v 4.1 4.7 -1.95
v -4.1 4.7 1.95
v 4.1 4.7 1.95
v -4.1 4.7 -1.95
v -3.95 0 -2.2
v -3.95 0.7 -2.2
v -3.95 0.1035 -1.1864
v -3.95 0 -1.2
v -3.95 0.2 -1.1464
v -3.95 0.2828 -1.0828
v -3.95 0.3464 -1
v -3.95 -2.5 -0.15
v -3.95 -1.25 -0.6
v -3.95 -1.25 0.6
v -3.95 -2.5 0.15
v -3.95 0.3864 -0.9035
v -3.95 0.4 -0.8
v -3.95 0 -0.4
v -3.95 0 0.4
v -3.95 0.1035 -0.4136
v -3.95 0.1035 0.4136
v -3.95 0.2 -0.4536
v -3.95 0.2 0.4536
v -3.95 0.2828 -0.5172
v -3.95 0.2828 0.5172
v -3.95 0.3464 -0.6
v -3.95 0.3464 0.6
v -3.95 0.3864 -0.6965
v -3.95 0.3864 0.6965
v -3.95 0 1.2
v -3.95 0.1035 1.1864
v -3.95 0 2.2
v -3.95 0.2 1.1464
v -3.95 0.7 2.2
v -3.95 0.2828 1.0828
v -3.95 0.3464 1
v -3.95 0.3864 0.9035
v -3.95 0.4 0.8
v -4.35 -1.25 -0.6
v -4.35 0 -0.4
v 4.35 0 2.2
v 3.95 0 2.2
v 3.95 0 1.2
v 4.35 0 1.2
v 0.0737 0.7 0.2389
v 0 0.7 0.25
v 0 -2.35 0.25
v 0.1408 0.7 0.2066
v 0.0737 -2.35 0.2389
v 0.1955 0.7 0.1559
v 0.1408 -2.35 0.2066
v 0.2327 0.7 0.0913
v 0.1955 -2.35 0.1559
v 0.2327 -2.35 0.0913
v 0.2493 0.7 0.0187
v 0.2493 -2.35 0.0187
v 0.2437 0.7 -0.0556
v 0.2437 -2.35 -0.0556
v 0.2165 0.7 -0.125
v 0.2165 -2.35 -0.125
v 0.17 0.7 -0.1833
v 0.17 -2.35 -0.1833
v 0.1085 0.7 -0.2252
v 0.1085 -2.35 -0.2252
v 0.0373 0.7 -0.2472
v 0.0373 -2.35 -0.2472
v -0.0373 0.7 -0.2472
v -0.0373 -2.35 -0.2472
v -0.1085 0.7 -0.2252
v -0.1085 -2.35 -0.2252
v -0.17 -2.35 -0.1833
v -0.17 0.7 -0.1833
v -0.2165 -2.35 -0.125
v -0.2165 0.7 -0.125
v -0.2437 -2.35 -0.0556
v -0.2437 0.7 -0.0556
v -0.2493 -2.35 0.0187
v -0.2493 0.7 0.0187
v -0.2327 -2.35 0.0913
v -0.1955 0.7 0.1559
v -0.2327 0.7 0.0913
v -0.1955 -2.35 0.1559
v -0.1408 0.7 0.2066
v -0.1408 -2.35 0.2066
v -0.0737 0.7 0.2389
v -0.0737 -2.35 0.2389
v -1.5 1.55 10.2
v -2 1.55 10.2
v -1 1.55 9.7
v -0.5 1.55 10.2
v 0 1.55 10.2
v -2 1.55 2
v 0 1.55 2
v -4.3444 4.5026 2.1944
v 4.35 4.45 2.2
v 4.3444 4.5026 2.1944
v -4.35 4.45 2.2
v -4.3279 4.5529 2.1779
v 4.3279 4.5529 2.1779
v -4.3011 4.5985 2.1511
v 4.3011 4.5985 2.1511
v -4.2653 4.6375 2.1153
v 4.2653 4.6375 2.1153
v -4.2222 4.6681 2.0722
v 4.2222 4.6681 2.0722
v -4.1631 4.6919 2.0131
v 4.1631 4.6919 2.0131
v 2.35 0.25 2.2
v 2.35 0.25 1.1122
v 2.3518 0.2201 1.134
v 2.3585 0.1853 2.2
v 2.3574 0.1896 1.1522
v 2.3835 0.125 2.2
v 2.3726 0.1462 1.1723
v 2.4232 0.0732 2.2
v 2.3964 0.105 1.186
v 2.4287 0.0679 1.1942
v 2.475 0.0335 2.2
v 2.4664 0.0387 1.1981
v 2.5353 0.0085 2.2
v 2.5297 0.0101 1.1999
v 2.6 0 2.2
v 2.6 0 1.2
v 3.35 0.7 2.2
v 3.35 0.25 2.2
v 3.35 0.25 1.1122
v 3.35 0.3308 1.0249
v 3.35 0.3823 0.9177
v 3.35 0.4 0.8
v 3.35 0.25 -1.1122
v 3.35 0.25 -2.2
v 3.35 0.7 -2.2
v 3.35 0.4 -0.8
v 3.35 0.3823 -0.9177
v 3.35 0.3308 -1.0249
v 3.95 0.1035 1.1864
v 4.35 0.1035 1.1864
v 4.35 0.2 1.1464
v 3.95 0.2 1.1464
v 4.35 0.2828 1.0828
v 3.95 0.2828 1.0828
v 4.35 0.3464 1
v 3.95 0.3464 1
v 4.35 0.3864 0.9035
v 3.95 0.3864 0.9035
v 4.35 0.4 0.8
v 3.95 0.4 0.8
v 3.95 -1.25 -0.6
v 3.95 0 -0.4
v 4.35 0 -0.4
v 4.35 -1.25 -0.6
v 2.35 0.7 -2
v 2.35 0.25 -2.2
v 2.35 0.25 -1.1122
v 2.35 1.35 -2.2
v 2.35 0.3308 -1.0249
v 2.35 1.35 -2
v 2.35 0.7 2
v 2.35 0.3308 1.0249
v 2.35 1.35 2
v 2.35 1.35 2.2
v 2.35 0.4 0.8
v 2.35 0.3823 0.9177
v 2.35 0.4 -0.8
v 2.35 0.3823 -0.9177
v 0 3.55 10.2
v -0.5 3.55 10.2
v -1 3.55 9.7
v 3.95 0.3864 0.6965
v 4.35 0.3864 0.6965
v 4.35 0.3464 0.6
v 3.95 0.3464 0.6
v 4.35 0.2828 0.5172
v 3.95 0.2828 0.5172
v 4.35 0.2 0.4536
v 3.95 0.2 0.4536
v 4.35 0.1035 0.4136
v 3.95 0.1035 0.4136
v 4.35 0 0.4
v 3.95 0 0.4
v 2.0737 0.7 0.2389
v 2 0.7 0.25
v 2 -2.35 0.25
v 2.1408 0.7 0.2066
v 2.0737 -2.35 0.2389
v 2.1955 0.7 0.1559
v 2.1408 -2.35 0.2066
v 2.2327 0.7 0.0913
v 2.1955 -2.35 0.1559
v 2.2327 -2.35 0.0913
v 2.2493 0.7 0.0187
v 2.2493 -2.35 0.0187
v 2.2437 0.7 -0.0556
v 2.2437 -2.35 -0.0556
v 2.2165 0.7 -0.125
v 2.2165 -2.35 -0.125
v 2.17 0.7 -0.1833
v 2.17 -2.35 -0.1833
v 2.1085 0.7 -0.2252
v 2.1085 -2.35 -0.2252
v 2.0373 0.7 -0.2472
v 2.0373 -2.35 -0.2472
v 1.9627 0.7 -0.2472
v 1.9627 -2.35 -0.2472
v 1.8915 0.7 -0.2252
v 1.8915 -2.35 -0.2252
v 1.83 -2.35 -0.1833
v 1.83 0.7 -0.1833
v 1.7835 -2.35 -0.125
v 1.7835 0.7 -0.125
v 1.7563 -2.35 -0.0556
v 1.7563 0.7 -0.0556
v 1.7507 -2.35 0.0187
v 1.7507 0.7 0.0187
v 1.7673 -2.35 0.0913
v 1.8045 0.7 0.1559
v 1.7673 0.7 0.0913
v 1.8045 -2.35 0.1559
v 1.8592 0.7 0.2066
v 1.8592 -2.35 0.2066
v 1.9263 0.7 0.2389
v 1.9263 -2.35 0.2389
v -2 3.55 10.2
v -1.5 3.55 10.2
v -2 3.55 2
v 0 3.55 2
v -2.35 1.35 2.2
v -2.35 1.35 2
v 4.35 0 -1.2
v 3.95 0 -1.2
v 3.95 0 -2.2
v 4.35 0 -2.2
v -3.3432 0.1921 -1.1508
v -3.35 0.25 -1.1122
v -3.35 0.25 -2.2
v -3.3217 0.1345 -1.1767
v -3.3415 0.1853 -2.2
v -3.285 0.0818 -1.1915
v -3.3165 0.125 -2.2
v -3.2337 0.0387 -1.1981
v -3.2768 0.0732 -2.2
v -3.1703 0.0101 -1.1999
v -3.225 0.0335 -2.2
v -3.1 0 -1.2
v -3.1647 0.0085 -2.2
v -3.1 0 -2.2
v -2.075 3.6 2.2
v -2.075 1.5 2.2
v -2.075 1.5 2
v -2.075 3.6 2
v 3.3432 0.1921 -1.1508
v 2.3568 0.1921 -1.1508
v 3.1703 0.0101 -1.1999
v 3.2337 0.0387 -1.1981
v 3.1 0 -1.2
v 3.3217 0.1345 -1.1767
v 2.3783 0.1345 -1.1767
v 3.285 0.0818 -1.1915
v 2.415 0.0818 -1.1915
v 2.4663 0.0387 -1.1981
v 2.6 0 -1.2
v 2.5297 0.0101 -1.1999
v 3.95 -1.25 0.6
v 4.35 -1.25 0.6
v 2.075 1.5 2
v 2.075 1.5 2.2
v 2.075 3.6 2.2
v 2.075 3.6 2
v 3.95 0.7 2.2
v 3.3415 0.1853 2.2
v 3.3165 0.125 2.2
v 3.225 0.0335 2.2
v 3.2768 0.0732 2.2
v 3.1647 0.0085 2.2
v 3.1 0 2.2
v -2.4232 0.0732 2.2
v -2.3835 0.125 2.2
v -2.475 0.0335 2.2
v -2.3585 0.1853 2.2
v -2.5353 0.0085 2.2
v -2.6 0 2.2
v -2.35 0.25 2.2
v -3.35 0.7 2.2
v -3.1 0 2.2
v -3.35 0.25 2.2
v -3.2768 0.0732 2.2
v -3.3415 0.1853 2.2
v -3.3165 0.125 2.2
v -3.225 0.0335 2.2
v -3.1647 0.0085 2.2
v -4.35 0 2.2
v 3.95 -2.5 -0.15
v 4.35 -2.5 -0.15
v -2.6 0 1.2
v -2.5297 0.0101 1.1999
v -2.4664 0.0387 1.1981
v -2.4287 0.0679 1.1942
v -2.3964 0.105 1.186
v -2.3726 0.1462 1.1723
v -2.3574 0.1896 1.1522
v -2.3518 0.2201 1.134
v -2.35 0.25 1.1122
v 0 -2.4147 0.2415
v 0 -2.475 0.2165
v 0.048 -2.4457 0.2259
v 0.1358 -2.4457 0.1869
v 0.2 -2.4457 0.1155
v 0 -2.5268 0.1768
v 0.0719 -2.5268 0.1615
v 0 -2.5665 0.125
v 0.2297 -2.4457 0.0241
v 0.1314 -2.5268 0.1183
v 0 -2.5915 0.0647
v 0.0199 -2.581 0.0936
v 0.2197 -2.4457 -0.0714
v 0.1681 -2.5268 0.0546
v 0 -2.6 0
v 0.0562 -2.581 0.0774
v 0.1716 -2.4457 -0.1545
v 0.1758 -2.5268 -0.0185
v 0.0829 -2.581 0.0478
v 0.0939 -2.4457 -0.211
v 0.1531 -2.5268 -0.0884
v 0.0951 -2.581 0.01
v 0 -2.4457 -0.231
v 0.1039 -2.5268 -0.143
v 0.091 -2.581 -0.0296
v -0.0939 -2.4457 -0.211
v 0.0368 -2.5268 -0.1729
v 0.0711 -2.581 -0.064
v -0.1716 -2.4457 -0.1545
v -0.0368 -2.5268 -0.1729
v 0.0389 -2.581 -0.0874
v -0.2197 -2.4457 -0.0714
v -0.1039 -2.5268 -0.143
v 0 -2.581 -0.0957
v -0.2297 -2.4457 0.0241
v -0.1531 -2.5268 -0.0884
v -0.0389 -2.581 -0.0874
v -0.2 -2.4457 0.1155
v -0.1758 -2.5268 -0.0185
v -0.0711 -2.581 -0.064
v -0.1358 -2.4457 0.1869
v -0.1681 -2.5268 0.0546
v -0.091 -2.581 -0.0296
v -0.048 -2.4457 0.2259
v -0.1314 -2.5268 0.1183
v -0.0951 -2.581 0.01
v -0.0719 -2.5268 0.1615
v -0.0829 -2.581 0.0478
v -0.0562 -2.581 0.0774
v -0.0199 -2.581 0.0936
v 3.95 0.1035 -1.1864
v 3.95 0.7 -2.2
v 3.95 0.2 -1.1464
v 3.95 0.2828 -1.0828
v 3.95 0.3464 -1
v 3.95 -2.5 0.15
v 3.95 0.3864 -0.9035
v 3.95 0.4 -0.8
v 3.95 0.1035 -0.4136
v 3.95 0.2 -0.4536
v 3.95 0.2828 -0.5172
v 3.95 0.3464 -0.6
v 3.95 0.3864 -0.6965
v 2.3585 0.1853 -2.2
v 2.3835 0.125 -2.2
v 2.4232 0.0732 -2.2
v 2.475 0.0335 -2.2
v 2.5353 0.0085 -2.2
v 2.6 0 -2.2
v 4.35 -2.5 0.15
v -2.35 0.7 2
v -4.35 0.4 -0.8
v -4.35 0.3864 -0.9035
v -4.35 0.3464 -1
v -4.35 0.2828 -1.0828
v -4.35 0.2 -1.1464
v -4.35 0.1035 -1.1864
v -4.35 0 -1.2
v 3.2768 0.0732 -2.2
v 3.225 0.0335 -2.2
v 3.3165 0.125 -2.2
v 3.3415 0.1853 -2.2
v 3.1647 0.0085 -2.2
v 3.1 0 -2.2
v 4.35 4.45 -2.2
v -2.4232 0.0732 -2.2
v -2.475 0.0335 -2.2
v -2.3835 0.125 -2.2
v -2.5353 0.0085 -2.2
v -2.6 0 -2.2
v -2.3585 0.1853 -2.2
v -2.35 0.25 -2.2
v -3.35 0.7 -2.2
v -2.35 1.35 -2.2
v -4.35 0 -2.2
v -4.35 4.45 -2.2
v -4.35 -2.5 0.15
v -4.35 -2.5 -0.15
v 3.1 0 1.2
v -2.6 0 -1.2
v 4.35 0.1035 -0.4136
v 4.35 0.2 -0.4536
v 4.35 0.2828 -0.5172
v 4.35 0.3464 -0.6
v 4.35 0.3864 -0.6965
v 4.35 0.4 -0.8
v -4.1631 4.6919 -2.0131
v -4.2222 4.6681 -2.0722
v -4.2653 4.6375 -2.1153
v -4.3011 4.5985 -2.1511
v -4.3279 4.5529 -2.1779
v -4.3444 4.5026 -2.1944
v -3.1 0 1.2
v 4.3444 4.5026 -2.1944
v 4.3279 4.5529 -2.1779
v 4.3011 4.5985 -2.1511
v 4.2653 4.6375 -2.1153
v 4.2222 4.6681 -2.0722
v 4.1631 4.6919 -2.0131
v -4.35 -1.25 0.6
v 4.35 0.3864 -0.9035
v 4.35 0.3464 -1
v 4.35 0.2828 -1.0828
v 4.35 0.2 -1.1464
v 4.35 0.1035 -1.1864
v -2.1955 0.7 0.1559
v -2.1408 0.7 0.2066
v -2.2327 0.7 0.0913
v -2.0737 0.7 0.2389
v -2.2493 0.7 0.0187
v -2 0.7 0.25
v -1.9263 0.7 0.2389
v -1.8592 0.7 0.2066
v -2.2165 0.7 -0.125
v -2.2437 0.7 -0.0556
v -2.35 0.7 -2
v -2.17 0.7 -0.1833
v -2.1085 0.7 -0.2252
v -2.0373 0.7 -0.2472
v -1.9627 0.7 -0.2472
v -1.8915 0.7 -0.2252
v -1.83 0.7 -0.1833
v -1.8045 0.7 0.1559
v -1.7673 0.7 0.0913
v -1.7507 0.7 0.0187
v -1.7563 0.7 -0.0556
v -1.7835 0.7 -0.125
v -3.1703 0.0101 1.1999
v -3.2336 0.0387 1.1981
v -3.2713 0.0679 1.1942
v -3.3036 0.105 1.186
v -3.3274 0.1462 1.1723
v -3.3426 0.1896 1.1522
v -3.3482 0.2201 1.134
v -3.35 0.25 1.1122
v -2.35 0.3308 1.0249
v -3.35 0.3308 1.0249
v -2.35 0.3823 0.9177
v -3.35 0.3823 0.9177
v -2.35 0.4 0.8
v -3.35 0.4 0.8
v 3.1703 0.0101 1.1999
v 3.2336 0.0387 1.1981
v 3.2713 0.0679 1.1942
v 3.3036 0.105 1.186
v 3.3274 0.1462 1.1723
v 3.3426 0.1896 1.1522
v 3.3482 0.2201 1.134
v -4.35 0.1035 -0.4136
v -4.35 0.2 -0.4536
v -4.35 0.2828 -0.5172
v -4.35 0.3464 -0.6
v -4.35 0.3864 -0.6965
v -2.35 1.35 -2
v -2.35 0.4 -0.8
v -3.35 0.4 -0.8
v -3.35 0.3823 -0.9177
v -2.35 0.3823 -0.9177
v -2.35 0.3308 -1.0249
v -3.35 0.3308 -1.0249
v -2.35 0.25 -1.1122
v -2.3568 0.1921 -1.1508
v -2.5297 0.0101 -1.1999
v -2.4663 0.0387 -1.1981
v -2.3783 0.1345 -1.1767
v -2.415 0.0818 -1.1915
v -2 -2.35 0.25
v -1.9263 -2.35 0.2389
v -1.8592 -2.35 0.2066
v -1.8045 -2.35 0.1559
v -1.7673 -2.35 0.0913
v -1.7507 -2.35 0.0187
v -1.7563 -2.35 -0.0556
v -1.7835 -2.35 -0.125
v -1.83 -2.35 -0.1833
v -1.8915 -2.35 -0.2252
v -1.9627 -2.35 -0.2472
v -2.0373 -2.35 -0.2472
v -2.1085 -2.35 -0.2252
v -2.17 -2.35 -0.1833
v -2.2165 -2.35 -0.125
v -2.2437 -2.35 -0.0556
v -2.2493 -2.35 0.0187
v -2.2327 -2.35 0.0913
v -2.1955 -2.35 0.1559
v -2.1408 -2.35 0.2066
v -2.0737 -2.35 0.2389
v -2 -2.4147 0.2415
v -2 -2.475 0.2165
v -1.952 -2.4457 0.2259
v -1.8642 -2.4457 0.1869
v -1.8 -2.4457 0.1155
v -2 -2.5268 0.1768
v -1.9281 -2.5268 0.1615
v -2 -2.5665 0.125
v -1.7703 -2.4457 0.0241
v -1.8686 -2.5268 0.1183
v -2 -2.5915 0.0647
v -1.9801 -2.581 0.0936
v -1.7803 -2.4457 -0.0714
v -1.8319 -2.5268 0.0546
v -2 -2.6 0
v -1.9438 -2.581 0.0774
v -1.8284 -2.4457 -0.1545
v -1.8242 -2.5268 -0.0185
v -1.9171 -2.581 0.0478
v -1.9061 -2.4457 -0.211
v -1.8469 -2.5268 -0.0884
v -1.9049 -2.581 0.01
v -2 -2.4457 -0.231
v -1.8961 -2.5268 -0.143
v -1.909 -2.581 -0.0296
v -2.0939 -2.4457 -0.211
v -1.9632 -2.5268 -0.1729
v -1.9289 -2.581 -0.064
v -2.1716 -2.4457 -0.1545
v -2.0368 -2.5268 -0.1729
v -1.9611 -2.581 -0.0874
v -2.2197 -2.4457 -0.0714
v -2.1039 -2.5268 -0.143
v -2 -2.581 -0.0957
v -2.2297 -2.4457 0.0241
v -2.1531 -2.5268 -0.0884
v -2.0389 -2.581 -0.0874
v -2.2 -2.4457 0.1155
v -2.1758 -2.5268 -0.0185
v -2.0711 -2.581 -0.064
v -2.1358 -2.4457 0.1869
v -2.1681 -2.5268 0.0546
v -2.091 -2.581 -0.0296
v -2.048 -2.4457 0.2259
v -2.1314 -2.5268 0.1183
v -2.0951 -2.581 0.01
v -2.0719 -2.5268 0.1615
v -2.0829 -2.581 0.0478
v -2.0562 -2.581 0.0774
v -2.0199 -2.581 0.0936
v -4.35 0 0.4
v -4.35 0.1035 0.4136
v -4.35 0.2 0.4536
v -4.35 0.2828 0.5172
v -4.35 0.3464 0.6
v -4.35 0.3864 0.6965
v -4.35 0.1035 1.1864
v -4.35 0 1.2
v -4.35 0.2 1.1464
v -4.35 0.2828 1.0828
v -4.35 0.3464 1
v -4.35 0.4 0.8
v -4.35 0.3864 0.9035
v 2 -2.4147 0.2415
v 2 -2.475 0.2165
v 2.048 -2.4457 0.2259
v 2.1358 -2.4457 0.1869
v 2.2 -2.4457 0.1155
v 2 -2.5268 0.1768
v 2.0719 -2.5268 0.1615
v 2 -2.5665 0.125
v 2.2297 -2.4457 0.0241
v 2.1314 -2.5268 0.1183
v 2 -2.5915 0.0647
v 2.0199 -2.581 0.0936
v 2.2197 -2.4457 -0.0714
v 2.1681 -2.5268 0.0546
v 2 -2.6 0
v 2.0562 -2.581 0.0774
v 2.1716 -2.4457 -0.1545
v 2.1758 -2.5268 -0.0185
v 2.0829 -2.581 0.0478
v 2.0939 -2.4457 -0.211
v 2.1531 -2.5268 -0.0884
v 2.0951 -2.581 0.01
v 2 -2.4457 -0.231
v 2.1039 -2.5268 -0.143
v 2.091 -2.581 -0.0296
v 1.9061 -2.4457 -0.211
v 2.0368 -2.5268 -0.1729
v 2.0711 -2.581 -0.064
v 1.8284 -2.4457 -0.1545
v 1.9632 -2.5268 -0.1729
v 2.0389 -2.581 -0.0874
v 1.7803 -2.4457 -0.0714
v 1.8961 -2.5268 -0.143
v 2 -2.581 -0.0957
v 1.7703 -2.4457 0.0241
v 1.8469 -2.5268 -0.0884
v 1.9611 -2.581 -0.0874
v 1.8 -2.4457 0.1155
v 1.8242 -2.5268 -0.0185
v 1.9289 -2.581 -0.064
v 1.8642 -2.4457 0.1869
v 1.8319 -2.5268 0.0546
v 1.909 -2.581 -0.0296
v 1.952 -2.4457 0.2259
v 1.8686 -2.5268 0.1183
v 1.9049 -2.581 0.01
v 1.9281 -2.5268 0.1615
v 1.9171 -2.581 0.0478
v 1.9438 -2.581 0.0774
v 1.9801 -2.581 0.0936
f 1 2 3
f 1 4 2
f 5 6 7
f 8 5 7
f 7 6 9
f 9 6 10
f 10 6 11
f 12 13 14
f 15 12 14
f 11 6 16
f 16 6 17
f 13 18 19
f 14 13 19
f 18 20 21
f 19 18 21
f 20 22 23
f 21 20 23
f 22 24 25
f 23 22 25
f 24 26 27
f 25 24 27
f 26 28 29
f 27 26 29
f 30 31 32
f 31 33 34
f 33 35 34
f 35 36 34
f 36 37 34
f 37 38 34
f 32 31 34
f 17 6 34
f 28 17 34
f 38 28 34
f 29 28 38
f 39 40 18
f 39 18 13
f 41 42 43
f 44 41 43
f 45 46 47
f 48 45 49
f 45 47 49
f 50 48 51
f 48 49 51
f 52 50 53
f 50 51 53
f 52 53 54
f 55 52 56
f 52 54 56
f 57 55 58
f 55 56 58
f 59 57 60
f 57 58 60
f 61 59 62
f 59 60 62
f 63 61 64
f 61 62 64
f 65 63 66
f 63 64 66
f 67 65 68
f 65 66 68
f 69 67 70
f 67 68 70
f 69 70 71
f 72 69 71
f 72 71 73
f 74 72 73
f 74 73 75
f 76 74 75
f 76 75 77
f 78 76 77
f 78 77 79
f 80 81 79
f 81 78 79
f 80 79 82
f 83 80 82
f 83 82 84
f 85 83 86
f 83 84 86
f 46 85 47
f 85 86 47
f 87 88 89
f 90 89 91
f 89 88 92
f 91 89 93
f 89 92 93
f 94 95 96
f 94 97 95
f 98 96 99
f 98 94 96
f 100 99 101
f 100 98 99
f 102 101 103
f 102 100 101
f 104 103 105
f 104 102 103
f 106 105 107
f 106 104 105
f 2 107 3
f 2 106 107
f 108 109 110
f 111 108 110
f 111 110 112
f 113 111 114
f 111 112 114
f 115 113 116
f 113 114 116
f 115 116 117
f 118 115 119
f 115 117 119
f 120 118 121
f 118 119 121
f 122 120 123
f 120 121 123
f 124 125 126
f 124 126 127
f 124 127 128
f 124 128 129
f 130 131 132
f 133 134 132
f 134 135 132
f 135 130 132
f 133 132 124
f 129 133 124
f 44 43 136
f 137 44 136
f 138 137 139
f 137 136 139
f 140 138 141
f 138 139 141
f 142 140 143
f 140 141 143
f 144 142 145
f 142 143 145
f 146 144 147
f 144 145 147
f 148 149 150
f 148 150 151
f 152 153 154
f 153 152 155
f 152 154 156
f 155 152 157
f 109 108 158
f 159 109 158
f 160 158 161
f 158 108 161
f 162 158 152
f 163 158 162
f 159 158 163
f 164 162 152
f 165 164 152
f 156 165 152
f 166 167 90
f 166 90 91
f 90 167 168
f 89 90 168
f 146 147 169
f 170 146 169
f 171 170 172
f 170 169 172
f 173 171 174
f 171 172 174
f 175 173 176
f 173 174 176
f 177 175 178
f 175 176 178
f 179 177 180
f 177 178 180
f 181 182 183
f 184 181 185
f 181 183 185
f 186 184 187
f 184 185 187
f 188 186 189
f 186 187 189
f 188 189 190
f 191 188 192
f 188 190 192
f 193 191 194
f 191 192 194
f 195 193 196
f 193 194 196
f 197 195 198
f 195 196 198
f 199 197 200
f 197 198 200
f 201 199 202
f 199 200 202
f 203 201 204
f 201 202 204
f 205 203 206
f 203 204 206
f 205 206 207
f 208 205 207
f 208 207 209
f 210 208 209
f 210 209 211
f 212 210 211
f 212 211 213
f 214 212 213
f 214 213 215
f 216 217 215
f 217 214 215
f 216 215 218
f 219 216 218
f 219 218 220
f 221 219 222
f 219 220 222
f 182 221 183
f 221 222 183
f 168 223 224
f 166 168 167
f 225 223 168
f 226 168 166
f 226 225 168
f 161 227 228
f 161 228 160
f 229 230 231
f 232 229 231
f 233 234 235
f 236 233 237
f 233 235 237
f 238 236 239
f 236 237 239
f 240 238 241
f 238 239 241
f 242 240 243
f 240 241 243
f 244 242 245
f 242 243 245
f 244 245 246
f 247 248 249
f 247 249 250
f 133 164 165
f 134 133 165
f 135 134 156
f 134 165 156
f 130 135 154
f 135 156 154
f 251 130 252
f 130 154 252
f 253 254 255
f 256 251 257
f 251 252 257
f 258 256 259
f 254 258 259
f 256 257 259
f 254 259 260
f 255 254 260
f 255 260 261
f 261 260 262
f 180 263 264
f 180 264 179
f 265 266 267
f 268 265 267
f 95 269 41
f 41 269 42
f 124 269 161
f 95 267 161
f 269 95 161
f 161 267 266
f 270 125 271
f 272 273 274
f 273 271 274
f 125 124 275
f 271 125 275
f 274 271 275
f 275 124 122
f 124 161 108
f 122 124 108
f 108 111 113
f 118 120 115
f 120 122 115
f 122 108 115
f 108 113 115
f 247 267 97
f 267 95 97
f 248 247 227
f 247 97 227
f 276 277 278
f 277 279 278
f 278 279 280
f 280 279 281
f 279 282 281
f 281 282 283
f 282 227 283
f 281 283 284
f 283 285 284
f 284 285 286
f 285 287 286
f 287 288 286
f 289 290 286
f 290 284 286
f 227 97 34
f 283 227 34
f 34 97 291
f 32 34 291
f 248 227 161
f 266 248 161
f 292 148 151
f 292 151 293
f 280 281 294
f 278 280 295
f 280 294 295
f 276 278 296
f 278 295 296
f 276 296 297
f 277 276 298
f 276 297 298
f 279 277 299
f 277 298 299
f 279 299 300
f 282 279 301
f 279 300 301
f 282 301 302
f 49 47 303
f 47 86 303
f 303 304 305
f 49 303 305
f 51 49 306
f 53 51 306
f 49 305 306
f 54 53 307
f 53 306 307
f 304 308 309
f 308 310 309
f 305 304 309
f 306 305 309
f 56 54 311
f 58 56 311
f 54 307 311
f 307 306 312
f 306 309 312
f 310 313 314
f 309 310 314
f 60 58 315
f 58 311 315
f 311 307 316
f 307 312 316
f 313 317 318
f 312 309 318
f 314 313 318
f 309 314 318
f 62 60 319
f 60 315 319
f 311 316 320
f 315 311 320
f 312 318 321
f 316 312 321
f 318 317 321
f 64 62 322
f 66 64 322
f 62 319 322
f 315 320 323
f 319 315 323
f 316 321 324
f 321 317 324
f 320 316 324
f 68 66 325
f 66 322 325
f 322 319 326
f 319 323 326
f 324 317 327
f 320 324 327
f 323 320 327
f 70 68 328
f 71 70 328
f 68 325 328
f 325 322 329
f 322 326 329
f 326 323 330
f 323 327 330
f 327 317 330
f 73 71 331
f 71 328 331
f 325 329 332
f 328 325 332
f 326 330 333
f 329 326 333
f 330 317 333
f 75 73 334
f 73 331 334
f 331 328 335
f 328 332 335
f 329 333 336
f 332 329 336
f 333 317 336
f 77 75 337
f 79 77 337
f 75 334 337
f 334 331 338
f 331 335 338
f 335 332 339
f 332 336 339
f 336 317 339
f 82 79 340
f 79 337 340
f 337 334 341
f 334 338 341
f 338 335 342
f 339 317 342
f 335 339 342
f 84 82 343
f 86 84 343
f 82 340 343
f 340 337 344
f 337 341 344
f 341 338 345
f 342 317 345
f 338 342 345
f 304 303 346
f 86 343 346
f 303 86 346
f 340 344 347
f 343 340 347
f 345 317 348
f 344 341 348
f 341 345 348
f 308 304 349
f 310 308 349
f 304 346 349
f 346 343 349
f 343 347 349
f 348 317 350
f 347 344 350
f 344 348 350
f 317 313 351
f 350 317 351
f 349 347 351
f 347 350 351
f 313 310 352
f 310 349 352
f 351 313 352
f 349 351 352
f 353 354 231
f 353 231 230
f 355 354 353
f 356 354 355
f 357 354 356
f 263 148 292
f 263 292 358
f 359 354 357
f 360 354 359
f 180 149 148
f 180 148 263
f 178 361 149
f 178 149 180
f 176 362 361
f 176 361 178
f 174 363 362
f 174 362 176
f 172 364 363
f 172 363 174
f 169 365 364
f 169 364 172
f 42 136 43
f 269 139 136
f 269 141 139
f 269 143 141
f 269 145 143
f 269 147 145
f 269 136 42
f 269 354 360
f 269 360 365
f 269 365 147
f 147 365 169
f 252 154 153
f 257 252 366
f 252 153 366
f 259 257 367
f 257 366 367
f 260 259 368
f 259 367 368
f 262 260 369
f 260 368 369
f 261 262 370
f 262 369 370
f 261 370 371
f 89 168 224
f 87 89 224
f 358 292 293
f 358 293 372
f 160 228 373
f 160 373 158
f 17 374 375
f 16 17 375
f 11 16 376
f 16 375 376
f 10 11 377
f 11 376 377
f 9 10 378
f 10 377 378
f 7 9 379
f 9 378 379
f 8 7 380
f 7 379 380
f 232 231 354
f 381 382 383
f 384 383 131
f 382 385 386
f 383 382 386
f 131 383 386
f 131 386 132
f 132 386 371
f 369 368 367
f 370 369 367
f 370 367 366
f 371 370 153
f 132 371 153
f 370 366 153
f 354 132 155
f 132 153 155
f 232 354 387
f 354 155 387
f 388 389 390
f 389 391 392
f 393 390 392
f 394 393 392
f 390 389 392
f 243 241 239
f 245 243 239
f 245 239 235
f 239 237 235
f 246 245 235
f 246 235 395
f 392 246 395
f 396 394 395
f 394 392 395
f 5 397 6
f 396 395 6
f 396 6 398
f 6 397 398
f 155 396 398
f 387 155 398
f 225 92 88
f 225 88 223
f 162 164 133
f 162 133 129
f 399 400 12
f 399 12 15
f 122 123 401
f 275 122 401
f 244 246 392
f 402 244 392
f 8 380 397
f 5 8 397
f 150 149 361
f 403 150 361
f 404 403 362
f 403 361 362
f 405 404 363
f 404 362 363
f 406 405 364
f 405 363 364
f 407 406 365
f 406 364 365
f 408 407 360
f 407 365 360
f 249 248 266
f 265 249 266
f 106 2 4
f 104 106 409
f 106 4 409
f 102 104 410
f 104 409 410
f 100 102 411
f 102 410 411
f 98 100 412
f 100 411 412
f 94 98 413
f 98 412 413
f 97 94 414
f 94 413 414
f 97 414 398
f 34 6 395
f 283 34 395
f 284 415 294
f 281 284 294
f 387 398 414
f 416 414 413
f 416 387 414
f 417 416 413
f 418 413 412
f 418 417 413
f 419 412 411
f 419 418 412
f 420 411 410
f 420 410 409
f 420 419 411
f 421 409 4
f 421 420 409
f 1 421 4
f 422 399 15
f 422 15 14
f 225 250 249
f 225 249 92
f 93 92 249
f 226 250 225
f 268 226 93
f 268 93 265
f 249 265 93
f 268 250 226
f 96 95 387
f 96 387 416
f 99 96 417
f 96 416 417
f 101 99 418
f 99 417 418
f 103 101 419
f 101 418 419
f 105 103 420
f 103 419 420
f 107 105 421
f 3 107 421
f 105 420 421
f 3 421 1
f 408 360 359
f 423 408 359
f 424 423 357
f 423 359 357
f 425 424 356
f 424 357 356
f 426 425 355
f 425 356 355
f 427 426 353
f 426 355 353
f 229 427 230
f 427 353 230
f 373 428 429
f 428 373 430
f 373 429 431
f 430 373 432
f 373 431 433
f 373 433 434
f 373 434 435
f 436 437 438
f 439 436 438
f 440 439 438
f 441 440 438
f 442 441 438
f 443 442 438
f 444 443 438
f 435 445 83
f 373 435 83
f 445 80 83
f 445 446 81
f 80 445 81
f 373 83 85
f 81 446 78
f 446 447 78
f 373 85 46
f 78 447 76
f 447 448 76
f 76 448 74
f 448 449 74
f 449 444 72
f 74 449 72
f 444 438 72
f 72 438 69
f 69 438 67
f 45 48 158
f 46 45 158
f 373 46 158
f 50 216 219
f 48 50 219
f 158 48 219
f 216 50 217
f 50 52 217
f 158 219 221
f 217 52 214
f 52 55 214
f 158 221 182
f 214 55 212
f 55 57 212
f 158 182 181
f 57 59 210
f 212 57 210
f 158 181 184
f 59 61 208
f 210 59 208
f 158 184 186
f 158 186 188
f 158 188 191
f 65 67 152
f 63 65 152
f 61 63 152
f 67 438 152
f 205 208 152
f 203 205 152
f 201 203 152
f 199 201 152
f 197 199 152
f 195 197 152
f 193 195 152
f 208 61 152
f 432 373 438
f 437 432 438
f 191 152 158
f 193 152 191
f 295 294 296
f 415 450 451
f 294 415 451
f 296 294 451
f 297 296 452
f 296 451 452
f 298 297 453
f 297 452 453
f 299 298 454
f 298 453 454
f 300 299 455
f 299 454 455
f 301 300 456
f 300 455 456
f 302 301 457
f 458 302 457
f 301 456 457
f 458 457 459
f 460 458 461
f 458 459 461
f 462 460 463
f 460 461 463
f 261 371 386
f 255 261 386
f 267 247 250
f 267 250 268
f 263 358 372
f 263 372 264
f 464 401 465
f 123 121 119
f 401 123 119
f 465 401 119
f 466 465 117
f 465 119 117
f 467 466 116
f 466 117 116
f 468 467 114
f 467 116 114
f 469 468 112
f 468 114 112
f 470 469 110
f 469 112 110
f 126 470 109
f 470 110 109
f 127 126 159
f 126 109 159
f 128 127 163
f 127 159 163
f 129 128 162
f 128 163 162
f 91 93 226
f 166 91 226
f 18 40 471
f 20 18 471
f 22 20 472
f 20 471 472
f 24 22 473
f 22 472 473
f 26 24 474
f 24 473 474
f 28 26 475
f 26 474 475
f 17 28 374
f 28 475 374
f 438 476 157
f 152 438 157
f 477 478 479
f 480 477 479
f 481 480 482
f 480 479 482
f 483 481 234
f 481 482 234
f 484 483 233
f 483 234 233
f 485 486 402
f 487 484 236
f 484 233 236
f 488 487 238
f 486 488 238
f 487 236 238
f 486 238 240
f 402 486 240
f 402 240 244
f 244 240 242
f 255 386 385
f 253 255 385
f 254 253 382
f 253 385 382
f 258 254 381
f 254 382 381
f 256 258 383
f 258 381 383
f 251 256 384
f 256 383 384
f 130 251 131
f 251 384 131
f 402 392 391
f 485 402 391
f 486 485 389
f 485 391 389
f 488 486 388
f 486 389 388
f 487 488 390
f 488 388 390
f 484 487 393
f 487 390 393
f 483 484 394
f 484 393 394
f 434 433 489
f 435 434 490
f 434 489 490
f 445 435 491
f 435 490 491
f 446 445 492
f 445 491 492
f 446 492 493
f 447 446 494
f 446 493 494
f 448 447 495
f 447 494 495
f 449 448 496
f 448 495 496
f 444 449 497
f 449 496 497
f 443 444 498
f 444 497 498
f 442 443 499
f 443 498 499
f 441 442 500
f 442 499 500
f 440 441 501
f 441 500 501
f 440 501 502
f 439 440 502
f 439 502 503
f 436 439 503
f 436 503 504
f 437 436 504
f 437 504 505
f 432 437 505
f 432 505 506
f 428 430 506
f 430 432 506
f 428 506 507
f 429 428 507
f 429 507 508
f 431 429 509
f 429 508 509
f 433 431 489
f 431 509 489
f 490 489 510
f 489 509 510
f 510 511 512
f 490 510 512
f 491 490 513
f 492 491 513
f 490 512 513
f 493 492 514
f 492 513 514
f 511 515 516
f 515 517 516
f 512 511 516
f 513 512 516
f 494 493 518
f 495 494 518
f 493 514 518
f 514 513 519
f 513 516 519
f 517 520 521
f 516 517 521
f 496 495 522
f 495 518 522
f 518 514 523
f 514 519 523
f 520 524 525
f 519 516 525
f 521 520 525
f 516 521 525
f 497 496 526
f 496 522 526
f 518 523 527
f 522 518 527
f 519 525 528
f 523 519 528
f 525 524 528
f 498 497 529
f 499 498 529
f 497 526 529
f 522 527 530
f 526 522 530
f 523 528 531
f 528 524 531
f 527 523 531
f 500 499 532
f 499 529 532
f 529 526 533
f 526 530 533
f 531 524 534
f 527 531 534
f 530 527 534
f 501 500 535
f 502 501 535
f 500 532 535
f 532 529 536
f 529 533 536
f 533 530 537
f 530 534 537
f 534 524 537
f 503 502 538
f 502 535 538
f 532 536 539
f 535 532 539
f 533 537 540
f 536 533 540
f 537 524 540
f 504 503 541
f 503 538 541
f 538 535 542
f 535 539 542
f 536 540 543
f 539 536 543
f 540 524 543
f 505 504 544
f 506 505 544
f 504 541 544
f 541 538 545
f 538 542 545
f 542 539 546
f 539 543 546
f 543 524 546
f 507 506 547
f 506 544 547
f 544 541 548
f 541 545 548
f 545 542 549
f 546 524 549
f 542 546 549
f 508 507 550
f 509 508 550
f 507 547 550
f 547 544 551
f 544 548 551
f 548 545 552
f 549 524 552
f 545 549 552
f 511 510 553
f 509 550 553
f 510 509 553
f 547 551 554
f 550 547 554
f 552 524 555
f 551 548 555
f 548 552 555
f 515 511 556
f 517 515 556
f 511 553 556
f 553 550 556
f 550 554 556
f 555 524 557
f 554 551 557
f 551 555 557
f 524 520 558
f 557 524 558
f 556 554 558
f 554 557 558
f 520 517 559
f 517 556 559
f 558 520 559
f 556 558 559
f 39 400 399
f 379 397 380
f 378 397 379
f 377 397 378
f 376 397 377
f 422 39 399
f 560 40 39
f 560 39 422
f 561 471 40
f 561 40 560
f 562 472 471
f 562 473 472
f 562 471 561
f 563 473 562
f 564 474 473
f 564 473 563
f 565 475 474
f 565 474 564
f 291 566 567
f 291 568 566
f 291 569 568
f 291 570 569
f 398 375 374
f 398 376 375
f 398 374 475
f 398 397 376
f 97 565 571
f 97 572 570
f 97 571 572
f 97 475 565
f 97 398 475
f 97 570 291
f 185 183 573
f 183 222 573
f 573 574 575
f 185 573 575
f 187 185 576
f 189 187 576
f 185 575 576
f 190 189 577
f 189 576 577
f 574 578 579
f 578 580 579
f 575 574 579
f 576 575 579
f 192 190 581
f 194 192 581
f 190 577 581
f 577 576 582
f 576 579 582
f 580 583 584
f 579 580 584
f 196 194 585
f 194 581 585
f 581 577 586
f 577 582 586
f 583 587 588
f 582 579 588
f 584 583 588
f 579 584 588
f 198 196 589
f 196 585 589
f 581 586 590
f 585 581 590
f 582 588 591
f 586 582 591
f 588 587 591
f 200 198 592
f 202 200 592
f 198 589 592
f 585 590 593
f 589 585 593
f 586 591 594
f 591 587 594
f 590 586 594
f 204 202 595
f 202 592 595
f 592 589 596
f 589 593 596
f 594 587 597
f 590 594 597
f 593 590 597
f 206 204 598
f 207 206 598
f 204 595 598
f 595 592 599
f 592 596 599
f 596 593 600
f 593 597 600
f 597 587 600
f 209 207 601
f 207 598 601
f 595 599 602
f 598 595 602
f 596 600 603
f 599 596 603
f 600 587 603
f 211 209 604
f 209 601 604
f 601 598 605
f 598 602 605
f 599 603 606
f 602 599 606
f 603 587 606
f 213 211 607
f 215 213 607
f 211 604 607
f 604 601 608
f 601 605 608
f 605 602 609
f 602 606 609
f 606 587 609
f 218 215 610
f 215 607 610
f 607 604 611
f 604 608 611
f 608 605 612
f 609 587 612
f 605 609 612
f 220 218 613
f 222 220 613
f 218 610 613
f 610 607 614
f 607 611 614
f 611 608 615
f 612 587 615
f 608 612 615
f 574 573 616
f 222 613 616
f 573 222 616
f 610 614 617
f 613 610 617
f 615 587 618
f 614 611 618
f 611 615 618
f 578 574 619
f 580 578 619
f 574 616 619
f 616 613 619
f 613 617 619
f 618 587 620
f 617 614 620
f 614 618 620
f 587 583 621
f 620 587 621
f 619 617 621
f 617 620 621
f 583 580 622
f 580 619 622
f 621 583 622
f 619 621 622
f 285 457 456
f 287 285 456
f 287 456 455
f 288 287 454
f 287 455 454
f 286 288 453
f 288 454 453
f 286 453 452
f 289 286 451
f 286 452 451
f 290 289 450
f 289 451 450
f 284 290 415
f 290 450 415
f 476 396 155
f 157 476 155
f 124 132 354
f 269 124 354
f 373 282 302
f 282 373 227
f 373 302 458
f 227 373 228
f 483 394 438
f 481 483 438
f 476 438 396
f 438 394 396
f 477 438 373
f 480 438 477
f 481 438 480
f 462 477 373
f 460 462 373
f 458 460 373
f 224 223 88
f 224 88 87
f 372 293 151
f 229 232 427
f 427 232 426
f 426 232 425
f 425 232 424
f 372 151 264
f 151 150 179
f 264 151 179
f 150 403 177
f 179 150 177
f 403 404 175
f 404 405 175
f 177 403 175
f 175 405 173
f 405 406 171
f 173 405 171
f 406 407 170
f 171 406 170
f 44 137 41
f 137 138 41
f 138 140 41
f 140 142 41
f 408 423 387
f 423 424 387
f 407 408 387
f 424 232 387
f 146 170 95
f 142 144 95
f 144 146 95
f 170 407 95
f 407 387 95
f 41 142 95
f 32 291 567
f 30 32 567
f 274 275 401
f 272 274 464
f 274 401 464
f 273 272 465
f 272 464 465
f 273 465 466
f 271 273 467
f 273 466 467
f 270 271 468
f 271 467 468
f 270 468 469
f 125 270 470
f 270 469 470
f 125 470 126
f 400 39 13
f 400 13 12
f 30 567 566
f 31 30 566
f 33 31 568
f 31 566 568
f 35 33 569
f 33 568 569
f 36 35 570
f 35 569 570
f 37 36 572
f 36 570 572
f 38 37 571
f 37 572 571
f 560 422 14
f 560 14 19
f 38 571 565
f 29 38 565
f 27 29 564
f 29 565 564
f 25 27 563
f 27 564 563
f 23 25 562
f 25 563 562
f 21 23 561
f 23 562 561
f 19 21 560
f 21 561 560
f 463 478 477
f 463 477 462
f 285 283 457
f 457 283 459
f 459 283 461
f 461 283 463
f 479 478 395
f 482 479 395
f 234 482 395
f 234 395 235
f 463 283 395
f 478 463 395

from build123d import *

# Parameters (mm, degrees)
BASE_START                 = 0.7
TOP_PROFILE_W              = 8.7
TOP_PROFILE_H              = 4.4
BASE_DEPTH                 = 4
BASE_START_2               = -2.2
BASE_EXTRUDE_DEPTH         = 4.4
BOTTOM_START               = 2.2
FRONT_PROFILE_4_W          = 4.7
FRONT_PROFILE_4_H          = 0.65
BOTTOM_FRONT_CUTOUT_DEPTH  = 0.2
BOTTOM_START_2             = -2.2
FRONT_PROFILE_5_W          = 4.7
FRONT_PROFILE_5_H          = 0.65
BOTTOM_REAR_CUTOUT_DEPTH   = 0.2
SWITCH_START               = 2.2
FRONT_PROFILE_6_W          = 4.15
FRONT_PROFILE_6_H          = 2.1
FRONT_PROFILE_6_W_2        = 2
FRONT_PROFILE_6_H_2        = 2
SWITCH_INSET_DEPTH         = 0.2
UNDERCUT_NOTCH_DEPTH       = 7.771447408
UNDERCUT_NOTCH_DEPTH_BACK  = 7.771447408
LEVER_DEPTH                = 8
LEVER_DEPTH_BACK           = 2.2
LEVER_START                = 2.2
FRONT_PROFILE_7_W          = 2
FRONT_PROFILE_7_H          = 2
RIGHT_START                = 3.95
RIGHT_PIN_DEPTH            = 0.4
LEFT_START                 = -4.35
LEFT_PIN_DEPTH             = 0.4
ELECTRICAL_PINS_DEPTH      = 4.7
ELECTRICAL_PINS_DEPTH_BACK = 2.6
PINS_R                     = 0.25
LEVER_NOTCH_DEPTH          = 13.043774325
LEVER_NOTCH_DEPTH_BACK     = 13.043774325
TOP_FILLET_R               = 0.25
PIN_FILLET_R               = 0.25


with BuildPart() as part:
    # Top Profile → Base (new body)
    with BuildSketch(Plane(origin=(0, 0, 0), x_dir=(1, 0, 0), z_dir=(0, 1, 0)).offset(BASE_START)):
        Rectangle(TOP_PROFILE_W, TOP_PROFILE_H)
    extrude(amount=BASE_DEPTH)

    # Front Profile → Base Extrude (add)
    with BuildSketch(Plane.XY.offset(BASE_START_2)):
        with BuildLine():
            Line((4.35, 0.7), (4.35, 4.7))
            Line((4.35, 4.7), (-4.35, 4.7))
            Line((-4.35, 4.7), (-4.35, 0.7))
            Line((-4.35, 0.7), (-3.35, 0.7))
            Line((-3.35, 0.7), (-3.35, 0.25))
            ThreePointArc((-3.35, 0.25), (-3.276776695, 0.073223305), (-3.1, 0))
            Line((-3.1, 0), (-2.6, 0))
            ThreePointArc((-2.6, 0), (-2.423223305, 0.073223305), (-2.35, 0.25))
            Line((-2.35, 0.25), (-2.35, 0.7))
            Line((-2.35, 0.7), (-2.35, 1.35))
            Line((-2.35, 1.35), (2.35, 1.35))
            Line((2.35, 1.35), (2.35, 0.7))
            Line((2.35, 0.7), (2.35, 0.25))
            ThreePointArc((2.35, 0.25), (2.423223305, 0.073223305), (2.6, 0))
            Line((2.6, 0), (3.1, 0))
            ThreePointArc((3.1, 0), (3.276776695, 0.073223305), (3.35, 0.25))
            Line((3.35, 0.25), (3.35, 0.7))
            Line((3.35, 0.7), (4.35, 0.7))
        make_face()
    extrude(amount=BASE_EXTRUDE_DEPTH)

    # Front Profile<4> → Bottom Front Cutout (cut)
    with BuildSketch(Plane.XY.offset(BOTTOM_START)):
        with Locations((0, 1.025)):
            Rectangle(FRONT_PROFILE_4_W, FRONT_PROFILE_4_H)
    extrude(amount=-BOTTOM_FRONT_CUTOUT_DEPTH, mode=Mode.SUBTRACT)

    # Front Profile<5> → Bottom Rear Cutout (cut)
    with BuildSketch(Plane.XY.offset(BOTTOM_START_2)):
        with Locations((0, 1.025)):
            Rectangle(FRONT_PROFILE_5_W, FRONT_PROFILE_5_H)
    extrude(amount=BOTTOM_REAR_CUTOUT_DEPTH, mode=Mode.SUBTRACT)

    # Front Profile<6> → Switch Inset (cut)
    # profile 1 of 2: a face of its own
    with BuildSketch(Plane.XY.offset(SWITCH_START)):
        with Locations((0, 2.55)):
            Rectangle(FRONT_PROFILE_6_W, FRONT_PROFILE_6_H)
        with Locations((-1, 2.55)):
            Rectangle(FRONT_PROFILE_6_W_2, FRONT_PROFILE_6_H_2, mode=Mode.SUBTRACT)
    # profile 2 of 2: a face of its own
    with BuildSketch(Plane.XY.offset(SWITCH_START)):
        with Locations((-1, 2.55)):
            Rectangle(FRONT_PROFILE_6_W_2, FRONT_PROFILE_6_H_2)
    extrude(amount=-SWITCH_INSET_DEPTH, mode=Mode.SUBTRACT)

    # Side Profile → Undercut Notch (cut, two sides: drawn at the far end of the back side and taken through both)
    with BuildSketch(Plane(origin=(0, 0, 0), x_dir=(0, 0, -1), z_dir=(1, 0, 0)).offset(-UNDERCUT_NOTCH_DEPTH_BACK)):
        with BuildLine():
            ThreePointArc((-1.2, 0), (-0.8, 0.4), (-0.4, 0))
            Line((-0.4, 0), (-1.2, 0))
        make_face()
        with BuildLine():
            ThreePointArc((0.4, 0), (0.8, 0.4), (1.2, 0))
            Line((1.2, 0), (0.4, 0))
        make_face()
        with BuildLine():
            ThreePointArc((-0.8, 0.4), (-0.517157288, 0.282842712), (-0.4, 0))
            Line((-0.4, 0), (0.4, 0))
            ThreePointArc((0.4, 0), (0.517157288, 0.282842712), (0.8, 0.4))
            Line((0.8, 0.4), (-0.8, 0.4))
        make_face()
    extrude(amount=UNDERCUT_NOTCH_DEPTH + UNDERCUT_NOTCH_DEPTH_BACK, mode=Mode.SUBTRACT)

    # Front Profile<7> → Lever (add, two sides: drawn at the far end of the back side and taken through both)
    with BuildSketch(Plane.XY.offset(LEVER_START - LEVER_DEPTH_BACK)):
        with Locations((-1, 2.55)):
            Rectangle(FRONT_PROFILE_7_W, FRONT_PROFILE_7_H)
    extrude(amount=LEVER_DEPTH + LEVER_DEPTH_BACK)

    # Side Profile<5> → Right Pin (add)
    with BuildSketch(Plane(origin=(0, 0, 0), x_dir=(0, 0, -1), z_dir=(1, 0, 0)).offset(RIGHT_START)):
        Polygon((-0.4, 0), (0.4, 0), (0.6, -1.25), (0.15, -2.5), (-0.15, -2.5), (-0.6, -1.25), align=None)
        with BuildLine():
            ThreePointArc((-0.8, 0.4), (-0.517157288, 0.282842712), (-0.4, 0))
            Line((-0.4, 0), (0.4, 0))
            ThreePointArc((0.4, 0), (0.517157288, 0.282842712), (0.8, 0.4))
            Line((0.8, 0.4), (-0.8, 0.4))
        make_face()
        with BuildLine():
            Line((2.2, 4.7), (-2.2, 4.7))
            Line((-2.2, 4.7), (-2.2, 0.7))
            Line((-2.2, 0.7), (-2.2, 0))
            Line((-2.2, 0), (-1.2, 0))
            ThreePointArc((-1.2, 0), (-1.082842712, 0.282842712), (-0.8, 0.4))
            Line((-0.8, 0.4), (0.8, 0.4))
            ThreePointArc((0.8, 0.4), (1.082842712, 0.282842712), (1.2, 0))
            Line((1.2, 0), (2.2, 0))
            Line((2.2, 0), (2.2, 0.7))
            Line((2.2, 0.7), (2.2, 4.7))
        make_face()
    extrude(amount=RIGHT_PIN_DEPTH)

    # Side Profile<6> → Left Pin (add)
    with BuildSketch(Plane(origin=(0, 0, 0), x_dir=(0, 0, -1), z_dir=(1, 0, 0)).offset(LEFT_START)):
        Polygon((-0.4, 0), (0.4, 0), (0.6, -1.25), (0.15, -2.5), (-0.15, -2.5), (-0.6, -1.25), align=None)
        with BuildLine():
            ThreePointArc((-0.8, 0.4), (-0.517157288, 0.282842712), (-0.4, 0))
            Line((-0.4, 0), (0.4, 0))
            ThreePointArc((0.4, 0), (0.517157288, 0.282842712), (0.8, 0.4))
            Line((0.8, 0.4), (-0.8, 0.4))
        make_face()
        with BuildLine():
            Line((2.2, 4.7), (-2.2, 4.7))
            Line((-2.2, 4.7), (-2.2, 0.7))
            Line((-2.2, 0.7), (-2.2, 0))
            Line((-2.2, 0), (-1.2, 0))
            ThreePointArc((-1.2, 0), (-1.082842712, 0.282842712), (-0.8, 0.4))
            Line((-0.8, 0.4), (0.8, 0.4))
            ThreePointArc((0.8, 0.4), (1.082842712, 0.282842712), (1.2, 0))
            Line((1.2, 0), (2.2, 0))
            Line((2.2, 0), (2.2, 0.7))
            Line((2.2, 0.7), (2.2, 4.7))
        make_face()
    extrude(amount=LEFT_PIN_DEPTH)

    # Pins → Electrical Pins (add, two sides: drawn at the far end of the back side and taken through both)
    with BuildSketch(Plane(origin=(0, 0, 0), x_dir=(1, 0, 0), z_dir=(0, 1, 0)).offset(-ELECTRICAL_PINS_DEPTH_BACK)):
        with Locations(Location((-2, 0, 0), (0, 0, 270))):
            Circle(PINS_R)
        with Locations(Location((0, 0, 0), (0, 0, 270))):
            Circle(PINS_R)
        with Locations(Location((2, 0, 0), (0, 0, 270))):
            Circle(PINS_R)
    extrude(amount=ELECTRICAL_PINS_DEPTH + ELECTRICAL_PINS_DEPTH_BACK)

    # Lever Notch Profile → Lever Notch (cut, two sides: drawn at the far end of the back side and taken through both)
    with BuildSketch(Plane(origin=(0, 0, 0), x_dir=(1, 0, 0), z_dir=(0, 1, 0)).offset(-LEVER_NOTCH_DEPTH_BACK)):
        Polygon((-1.5, -10.2), (-0.5, -10.2), (-1, -9.7), align=None)
    extrude(amount=LEVER_NOTCH_DEPTH + LEVER_NOTCH_DEPTH_BACK, mode=Mode.SUBTRACT)

    # Top Fillet
    top_fillet_edges = [part.edges().sort_by_distance(p)[0] for p in [
        (0, 4.7, 2.2),
        (4.35, 4.7, 0),
        (0, 4.7, -2.2),
        (-4.35, 4.7, 0),
    ]]
    fillet(top_fillet_edges, radius=TOP_FILLET_R)

    # Pin Fillet
    pin_fillet_edges = [part.edges().sort_by_distance(p)[0] for p in [
        (-2, -2.6, -0.25),
        (0, -2.6, -0.25),
        (2, -2.6, -0.25),
    ]]
    fillet(pin_fillet_edges, radius=PIN_FILLET_R)


solid = part.part
